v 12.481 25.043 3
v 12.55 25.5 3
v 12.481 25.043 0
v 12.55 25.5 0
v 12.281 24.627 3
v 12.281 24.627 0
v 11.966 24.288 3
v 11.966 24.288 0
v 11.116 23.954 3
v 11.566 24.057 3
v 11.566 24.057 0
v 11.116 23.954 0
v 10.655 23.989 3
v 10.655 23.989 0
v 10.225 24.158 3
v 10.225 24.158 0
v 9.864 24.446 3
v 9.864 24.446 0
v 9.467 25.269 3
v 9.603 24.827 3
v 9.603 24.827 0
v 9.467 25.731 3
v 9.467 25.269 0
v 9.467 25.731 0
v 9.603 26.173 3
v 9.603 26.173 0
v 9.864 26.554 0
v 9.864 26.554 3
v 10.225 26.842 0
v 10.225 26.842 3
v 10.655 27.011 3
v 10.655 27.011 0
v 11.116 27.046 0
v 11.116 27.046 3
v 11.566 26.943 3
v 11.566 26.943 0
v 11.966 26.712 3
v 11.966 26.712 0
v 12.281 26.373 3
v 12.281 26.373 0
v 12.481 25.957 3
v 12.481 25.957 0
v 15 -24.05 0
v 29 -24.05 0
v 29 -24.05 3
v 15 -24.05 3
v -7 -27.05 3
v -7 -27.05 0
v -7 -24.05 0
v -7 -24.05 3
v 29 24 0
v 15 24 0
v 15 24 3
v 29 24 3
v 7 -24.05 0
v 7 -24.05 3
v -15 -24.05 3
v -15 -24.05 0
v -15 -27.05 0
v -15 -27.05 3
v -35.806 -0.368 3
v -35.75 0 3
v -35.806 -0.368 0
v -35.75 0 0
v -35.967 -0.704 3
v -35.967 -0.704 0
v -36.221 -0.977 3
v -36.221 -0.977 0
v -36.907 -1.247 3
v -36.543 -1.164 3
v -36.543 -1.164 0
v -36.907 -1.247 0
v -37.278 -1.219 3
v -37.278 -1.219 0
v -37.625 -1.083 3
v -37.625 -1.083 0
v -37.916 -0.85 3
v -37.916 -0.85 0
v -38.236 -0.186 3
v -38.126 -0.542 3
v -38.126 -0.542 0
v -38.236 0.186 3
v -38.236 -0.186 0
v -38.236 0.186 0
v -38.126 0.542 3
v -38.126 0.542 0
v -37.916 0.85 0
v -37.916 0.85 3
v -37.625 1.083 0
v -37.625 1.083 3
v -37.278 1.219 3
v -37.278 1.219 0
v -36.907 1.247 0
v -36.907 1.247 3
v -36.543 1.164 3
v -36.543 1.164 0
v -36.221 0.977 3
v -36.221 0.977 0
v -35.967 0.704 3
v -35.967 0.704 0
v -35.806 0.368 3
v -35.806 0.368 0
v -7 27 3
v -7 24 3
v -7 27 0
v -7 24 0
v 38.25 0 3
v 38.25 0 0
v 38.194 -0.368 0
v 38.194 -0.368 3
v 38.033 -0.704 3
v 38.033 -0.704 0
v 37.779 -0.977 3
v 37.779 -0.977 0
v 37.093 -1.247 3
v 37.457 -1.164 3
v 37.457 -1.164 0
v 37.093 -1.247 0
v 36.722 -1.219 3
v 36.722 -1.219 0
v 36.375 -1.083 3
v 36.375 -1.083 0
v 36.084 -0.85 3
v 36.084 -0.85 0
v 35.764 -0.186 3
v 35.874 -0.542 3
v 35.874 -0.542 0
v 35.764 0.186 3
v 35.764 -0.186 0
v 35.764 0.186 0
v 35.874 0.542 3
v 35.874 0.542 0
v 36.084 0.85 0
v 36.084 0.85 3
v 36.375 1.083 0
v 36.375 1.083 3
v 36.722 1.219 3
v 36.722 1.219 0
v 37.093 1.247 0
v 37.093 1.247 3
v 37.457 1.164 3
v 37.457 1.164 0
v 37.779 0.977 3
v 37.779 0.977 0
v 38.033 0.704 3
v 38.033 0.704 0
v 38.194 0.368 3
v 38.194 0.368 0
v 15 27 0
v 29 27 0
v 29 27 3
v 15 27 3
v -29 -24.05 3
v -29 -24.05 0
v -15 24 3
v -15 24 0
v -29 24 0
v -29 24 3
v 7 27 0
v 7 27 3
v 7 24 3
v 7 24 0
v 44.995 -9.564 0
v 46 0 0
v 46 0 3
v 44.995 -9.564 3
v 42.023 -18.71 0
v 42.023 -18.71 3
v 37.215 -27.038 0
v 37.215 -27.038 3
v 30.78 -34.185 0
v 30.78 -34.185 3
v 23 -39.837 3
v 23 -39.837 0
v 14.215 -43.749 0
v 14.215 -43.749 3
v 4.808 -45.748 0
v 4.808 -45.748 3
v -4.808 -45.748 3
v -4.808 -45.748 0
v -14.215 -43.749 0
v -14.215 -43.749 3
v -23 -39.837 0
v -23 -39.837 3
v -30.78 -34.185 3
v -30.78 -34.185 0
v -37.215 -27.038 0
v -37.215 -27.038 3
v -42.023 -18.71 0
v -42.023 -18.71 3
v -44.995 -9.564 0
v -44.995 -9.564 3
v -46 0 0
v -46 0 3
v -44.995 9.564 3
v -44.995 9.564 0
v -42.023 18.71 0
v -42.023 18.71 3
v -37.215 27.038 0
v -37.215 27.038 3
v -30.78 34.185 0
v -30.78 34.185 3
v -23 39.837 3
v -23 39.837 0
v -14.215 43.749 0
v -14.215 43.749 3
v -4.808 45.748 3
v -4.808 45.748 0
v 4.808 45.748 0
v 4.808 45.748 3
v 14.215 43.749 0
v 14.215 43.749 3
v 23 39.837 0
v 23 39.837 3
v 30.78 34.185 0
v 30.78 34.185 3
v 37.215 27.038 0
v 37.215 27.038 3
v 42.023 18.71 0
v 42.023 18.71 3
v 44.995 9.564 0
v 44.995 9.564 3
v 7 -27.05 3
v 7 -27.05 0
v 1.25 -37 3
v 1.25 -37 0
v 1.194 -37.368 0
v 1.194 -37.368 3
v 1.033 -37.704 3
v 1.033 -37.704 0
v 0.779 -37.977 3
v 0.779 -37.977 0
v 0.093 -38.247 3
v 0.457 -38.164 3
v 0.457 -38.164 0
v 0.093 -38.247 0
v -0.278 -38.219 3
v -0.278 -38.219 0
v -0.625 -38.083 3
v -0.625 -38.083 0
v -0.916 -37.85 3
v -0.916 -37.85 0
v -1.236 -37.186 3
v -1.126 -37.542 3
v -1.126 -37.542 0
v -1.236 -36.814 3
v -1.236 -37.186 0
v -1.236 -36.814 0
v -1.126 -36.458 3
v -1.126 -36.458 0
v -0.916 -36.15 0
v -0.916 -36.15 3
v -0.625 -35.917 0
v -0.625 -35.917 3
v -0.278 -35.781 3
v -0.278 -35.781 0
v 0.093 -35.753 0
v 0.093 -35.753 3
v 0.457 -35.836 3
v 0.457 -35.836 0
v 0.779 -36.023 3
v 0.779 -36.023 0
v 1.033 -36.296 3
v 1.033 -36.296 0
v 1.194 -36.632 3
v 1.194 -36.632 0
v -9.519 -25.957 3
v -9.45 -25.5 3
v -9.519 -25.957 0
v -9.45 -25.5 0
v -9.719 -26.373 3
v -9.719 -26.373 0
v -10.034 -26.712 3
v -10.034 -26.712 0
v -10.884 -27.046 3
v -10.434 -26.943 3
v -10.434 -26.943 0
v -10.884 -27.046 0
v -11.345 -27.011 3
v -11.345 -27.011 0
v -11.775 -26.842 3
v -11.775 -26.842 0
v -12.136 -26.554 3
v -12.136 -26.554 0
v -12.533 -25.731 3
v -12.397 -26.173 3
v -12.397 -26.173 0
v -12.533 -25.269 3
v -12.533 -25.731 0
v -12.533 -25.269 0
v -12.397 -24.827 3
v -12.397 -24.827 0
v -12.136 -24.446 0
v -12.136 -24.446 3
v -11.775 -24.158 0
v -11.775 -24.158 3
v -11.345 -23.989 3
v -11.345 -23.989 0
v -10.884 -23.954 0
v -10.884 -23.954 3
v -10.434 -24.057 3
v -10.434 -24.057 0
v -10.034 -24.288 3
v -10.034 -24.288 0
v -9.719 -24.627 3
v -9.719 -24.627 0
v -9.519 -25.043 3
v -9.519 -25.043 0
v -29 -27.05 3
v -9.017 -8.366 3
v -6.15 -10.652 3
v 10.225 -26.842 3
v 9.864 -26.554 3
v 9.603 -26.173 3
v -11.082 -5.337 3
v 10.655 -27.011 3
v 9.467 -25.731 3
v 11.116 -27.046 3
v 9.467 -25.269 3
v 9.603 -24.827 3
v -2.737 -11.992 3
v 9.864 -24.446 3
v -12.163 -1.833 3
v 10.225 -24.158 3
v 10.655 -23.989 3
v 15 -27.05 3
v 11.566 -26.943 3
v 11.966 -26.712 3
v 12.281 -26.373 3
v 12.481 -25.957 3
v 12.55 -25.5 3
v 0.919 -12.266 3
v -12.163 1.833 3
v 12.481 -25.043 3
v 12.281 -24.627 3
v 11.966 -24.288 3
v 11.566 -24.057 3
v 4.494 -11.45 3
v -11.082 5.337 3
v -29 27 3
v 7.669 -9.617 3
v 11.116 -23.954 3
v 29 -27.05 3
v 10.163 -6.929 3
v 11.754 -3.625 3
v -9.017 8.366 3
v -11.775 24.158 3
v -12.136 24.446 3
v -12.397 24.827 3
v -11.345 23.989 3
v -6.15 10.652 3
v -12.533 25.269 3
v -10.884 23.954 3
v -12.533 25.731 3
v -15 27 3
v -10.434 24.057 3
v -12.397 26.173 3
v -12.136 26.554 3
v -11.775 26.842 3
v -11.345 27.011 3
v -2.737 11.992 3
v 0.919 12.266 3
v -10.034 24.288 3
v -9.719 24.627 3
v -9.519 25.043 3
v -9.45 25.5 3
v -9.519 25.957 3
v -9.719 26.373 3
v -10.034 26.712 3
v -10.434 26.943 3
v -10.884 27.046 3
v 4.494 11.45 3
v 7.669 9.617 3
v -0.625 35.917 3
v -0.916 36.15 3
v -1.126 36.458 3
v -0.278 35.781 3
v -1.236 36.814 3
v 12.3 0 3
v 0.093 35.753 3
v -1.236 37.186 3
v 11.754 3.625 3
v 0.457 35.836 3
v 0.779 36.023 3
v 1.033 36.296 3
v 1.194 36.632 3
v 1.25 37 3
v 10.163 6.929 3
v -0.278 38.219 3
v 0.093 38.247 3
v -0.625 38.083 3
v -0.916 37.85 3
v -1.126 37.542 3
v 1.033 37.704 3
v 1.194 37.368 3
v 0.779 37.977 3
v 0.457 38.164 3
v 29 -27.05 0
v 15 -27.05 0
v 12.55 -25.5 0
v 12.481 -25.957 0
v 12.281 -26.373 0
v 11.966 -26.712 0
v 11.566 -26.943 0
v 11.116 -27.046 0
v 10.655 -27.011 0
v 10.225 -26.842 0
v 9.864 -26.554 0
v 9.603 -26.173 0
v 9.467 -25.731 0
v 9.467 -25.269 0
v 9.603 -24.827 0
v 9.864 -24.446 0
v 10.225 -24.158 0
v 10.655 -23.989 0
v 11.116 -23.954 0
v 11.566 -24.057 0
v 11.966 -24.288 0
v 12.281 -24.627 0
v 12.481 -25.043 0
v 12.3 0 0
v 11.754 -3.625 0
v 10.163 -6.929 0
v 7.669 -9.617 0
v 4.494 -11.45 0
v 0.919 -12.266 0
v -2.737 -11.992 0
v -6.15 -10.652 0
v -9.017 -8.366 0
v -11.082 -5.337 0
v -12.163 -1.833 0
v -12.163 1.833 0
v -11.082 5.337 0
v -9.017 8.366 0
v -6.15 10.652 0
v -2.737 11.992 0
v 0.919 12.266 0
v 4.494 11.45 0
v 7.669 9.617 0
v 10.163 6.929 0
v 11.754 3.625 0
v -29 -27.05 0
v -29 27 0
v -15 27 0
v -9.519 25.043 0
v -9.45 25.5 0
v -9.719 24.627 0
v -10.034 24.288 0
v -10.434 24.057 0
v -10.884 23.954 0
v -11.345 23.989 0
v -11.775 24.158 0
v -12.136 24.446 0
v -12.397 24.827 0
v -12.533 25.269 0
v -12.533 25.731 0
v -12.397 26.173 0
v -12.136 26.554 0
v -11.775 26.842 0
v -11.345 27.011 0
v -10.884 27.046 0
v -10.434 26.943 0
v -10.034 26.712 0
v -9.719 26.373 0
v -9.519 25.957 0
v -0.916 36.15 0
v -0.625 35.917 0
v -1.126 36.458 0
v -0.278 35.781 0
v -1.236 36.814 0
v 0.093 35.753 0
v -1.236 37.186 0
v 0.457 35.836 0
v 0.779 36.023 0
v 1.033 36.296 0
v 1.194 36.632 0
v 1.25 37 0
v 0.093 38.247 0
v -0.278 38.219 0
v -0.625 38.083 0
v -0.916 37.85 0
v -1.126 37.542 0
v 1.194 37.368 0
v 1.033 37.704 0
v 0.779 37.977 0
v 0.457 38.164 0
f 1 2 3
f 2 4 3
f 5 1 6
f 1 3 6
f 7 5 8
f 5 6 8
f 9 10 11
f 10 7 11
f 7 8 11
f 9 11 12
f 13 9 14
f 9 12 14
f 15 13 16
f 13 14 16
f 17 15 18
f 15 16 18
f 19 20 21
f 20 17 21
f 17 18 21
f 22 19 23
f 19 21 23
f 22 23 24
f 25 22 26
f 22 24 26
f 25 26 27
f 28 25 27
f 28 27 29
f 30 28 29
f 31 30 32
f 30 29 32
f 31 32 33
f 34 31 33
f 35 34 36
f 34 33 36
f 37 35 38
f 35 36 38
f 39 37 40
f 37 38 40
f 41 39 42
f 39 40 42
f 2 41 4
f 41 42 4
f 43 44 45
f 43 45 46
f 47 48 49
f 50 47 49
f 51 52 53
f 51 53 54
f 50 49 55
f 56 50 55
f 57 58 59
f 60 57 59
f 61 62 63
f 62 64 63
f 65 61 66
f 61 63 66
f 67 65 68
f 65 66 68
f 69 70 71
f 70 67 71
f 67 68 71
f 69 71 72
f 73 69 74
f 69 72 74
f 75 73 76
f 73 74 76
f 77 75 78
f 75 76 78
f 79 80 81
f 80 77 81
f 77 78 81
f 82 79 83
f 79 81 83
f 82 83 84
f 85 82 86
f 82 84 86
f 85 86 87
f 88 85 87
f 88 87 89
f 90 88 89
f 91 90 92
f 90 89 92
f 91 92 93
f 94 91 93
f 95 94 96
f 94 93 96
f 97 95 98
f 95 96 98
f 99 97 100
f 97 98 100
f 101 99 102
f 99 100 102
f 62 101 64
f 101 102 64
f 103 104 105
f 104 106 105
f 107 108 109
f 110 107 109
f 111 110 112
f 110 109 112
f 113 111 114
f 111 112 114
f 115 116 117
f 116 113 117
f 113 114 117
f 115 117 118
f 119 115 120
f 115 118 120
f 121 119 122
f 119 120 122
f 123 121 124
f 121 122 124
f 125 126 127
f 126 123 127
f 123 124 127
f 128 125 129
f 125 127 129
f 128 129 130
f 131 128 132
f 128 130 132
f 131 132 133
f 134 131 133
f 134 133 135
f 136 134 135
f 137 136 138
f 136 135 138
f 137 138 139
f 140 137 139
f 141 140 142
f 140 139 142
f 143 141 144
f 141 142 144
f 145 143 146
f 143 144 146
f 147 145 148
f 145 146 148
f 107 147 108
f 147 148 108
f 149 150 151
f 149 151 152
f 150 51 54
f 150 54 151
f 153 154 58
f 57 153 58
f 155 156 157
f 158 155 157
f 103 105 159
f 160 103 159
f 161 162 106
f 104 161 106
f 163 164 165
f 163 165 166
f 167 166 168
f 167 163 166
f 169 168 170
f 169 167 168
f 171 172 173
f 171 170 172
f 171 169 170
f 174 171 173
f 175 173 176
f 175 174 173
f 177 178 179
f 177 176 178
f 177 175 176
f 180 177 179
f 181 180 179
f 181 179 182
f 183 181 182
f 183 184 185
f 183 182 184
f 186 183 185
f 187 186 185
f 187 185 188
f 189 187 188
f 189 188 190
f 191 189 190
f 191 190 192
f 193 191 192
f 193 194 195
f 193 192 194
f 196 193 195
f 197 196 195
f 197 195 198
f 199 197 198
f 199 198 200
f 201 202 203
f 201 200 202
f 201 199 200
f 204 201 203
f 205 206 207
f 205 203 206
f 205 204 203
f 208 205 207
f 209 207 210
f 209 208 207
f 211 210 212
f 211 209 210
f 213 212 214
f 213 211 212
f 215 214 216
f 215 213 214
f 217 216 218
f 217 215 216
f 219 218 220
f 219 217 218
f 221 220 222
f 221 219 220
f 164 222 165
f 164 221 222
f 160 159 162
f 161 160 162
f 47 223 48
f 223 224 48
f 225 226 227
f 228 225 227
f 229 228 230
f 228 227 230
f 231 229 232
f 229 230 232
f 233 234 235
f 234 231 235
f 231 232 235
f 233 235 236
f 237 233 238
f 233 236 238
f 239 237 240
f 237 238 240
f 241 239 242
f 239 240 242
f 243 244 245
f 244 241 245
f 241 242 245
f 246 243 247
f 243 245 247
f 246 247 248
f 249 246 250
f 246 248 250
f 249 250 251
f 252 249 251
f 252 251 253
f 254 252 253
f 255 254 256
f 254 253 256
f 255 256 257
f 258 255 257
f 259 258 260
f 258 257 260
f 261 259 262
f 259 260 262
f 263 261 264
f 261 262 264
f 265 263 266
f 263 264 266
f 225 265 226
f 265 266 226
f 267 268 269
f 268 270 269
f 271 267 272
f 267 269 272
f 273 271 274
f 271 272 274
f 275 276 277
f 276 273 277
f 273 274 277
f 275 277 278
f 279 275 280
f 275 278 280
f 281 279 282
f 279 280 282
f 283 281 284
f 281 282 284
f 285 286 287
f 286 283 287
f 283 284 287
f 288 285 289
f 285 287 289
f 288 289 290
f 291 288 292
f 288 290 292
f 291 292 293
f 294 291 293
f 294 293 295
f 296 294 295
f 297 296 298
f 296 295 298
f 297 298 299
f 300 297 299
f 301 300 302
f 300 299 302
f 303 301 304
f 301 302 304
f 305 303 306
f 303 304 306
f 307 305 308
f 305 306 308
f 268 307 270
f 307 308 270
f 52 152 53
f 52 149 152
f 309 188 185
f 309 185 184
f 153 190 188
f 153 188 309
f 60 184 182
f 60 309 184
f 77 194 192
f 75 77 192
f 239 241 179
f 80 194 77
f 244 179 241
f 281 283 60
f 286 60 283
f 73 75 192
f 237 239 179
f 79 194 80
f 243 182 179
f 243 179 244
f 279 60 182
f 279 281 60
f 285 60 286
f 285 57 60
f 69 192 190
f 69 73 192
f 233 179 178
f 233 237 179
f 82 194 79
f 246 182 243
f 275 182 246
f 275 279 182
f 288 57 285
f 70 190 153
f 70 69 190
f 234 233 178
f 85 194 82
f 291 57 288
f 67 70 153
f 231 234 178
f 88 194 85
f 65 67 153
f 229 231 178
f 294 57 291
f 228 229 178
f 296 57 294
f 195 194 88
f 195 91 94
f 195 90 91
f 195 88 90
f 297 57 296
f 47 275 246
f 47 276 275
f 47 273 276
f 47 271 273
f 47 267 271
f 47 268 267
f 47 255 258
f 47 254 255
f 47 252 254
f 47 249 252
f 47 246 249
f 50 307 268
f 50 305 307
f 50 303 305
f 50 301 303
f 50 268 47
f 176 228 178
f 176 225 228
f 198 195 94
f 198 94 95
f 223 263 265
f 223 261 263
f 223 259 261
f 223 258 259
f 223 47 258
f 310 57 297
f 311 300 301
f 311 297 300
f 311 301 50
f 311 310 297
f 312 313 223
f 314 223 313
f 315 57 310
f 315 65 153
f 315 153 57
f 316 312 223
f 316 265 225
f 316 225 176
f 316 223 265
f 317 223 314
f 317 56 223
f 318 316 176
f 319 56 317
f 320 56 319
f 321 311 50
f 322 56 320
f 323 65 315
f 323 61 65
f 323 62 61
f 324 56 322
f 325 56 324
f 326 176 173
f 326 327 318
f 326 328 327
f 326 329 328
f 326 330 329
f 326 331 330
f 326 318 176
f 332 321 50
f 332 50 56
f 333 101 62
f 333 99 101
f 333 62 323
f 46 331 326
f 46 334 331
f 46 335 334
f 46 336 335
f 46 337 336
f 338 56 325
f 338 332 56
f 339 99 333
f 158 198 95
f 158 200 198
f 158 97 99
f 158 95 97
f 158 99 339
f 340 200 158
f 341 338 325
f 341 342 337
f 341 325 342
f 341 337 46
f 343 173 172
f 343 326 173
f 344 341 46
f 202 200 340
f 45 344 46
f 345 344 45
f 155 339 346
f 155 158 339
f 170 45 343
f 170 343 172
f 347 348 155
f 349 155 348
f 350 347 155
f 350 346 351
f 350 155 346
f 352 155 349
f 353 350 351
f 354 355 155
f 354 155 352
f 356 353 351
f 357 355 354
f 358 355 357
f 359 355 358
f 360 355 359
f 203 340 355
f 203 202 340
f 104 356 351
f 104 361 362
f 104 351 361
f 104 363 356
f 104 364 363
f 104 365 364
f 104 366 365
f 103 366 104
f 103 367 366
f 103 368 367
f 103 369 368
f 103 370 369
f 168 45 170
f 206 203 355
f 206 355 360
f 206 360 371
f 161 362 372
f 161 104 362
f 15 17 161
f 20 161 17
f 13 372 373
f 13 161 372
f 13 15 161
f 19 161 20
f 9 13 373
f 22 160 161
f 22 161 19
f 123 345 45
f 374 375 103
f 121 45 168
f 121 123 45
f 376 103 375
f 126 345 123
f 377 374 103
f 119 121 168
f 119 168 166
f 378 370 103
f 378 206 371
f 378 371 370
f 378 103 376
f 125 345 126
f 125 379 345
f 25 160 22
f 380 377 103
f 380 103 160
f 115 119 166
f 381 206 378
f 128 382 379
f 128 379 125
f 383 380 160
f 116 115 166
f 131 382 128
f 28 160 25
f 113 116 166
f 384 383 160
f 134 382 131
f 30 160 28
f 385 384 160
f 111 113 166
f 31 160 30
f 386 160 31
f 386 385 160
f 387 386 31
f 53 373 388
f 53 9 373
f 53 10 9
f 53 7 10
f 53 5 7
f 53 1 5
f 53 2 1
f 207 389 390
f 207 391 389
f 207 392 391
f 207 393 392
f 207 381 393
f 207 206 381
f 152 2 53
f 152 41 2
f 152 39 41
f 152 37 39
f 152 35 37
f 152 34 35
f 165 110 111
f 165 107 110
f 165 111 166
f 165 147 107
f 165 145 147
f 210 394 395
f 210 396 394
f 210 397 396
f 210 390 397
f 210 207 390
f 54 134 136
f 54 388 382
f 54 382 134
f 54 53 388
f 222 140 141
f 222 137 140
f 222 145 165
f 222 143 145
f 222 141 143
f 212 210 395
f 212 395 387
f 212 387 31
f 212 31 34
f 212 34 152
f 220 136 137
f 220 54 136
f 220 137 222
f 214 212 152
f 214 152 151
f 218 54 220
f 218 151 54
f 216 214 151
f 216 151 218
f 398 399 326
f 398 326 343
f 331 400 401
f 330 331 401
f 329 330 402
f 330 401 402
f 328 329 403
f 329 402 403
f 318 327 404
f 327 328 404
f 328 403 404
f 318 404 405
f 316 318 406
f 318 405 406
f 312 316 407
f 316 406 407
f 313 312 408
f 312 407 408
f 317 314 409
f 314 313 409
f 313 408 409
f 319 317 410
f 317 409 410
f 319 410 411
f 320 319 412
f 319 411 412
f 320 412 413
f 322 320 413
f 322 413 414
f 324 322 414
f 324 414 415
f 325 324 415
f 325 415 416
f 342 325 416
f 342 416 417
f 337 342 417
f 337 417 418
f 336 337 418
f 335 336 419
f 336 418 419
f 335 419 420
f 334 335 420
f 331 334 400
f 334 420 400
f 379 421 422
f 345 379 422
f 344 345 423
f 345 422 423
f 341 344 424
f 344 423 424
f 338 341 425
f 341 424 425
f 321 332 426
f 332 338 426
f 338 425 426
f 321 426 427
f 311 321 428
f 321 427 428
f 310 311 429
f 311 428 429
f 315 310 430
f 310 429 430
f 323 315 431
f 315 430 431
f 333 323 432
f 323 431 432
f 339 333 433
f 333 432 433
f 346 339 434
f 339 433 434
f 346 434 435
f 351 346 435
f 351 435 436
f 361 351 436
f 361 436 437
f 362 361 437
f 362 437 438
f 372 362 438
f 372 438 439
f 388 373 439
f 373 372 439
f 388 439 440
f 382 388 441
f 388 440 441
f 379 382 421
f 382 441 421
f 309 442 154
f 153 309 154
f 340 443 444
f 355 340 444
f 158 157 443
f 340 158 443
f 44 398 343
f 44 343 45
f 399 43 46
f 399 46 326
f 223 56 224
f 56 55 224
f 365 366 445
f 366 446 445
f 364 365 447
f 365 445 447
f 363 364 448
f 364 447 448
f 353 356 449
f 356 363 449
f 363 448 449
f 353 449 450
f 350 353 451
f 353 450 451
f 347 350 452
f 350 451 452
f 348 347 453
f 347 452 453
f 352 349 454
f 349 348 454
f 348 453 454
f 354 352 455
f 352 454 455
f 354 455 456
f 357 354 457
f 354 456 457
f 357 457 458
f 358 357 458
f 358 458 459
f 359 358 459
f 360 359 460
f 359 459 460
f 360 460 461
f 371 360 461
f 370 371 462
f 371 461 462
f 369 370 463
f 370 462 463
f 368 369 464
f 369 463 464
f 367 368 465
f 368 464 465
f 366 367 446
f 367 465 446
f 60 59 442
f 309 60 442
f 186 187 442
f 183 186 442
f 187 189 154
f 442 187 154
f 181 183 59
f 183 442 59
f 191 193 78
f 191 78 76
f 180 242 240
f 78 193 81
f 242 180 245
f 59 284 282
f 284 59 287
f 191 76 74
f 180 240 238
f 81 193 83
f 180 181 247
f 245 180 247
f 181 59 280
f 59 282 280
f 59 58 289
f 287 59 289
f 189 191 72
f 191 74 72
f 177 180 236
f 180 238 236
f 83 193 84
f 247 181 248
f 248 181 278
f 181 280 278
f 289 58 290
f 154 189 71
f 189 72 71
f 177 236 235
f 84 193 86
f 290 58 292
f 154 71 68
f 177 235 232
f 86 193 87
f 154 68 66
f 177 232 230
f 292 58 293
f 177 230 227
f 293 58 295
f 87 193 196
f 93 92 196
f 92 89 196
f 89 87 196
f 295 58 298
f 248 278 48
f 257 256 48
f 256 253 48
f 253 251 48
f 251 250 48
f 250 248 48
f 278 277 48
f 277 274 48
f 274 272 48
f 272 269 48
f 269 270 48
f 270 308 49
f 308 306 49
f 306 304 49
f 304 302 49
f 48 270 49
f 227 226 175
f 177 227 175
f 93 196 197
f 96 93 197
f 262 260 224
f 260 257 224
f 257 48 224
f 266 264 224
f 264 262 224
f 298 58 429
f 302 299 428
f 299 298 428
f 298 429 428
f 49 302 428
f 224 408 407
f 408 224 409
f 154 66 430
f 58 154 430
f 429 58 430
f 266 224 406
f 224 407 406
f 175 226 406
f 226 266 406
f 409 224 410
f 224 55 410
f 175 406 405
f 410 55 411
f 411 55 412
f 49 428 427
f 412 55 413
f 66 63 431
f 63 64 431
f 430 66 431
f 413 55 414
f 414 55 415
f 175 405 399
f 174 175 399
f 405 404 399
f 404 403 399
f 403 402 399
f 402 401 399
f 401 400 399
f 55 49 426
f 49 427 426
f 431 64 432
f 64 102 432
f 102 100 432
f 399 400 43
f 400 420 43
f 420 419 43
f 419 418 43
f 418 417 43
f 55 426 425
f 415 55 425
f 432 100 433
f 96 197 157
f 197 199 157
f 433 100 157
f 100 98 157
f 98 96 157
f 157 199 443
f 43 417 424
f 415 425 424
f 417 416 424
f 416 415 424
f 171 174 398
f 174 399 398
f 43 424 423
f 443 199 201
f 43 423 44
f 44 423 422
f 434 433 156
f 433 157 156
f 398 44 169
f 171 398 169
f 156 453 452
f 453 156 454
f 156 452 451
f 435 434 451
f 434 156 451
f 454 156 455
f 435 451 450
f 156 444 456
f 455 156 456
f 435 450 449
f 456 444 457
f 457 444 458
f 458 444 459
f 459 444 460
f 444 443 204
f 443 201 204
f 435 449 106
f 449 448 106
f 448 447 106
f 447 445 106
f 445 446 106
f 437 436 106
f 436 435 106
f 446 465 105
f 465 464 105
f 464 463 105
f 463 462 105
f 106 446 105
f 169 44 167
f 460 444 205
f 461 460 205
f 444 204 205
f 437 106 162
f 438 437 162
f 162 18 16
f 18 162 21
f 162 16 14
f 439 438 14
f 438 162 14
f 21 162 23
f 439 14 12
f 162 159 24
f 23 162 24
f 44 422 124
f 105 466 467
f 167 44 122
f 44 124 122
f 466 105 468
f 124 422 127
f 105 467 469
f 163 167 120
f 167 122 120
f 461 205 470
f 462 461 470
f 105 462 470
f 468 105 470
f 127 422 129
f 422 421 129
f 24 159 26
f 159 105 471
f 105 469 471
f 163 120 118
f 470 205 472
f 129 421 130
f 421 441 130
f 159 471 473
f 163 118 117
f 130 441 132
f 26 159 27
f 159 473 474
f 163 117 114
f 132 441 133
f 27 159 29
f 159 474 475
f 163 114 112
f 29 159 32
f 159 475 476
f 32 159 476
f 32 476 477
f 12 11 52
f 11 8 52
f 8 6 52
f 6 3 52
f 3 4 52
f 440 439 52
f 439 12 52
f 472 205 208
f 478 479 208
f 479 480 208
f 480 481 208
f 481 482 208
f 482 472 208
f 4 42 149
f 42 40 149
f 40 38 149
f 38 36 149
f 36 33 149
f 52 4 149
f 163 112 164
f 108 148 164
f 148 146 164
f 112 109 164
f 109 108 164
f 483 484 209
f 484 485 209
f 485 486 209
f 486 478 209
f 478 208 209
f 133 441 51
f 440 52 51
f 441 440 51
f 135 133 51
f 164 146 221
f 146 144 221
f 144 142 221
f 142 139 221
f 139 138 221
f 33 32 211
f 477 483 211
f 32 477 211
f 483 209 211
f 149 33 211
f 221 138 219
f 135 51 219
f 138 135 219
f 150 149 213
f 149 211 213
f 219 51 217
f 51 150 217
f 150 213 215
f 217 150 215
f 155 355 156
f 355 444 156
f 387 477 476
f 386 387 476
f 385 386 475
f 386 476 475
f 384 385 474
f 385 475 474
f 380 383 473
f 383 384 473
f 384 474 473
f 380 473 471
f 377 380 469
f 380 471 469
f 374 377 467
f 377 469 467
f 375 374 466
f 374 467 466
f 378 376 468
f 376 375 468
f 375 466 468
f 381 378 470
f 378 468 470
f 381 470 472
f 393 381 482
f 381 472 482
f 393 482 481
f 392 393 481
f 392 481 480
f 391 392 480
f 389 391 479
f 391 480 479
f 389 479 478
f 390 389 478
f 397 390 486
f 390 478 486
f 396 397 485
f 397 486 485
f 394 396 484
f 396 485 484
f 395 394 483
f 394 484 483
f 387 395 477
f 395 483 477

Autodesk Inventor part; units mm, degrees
ref_plane "YZ Plane" through (0, 0, 0) normal (1, 0, 0) x (0, 1, 0)
ref_plane "XZ Plane" through (0, 0, 0) normal (0, 1, 0) x (-1, 0, 0)
ref_plane "XY Plane" through (0, 0, 0) normal (0, 0, 1) x (1, 0, 0)
sketch "Sketch3" plane through (0, 0, 0) normal (0, 0, 1) x (1, 0, 0)
  circle A0 centre (0, 0) radius 46
  circle A1 centre (0, 0) radius 12.3
  circle A2 centre (0, 0) radius 37 construction
  circle A3 centre (0, 37) radius 1.25
  circle A4 centre (37, 0) radius 1.25
  circle A5 centre (0, -37) radius 1.25
  circle A6 centre (-37, 0) radius 1.25
  line L0 (-11, 25.5) -> (-11, -25.5) construction
  circle A7 centre (-11, 25.5) radius 1.55
  circle A8 centre (-11, -25.5) radius 1.55
  circle A9 centre (11, -25.5) radius 1.55
  line L1 (7, -27.05) -> (-7, -27.05)
  line L2 (-7, -27.05) -> (-7, -24.05)
  line L3 (-7, -24.05) -> (7, -24.05)
  line L4 (7, -24.05) -> (7, -27.05)
  line L5 (-15, -27.05) -> (-29, -27.05)
  line L6 (-29, -27.05) -> (-29, -24.05)
  line L7 (-29, -24.05) -> (-15, -24.05)
  line L8 (-15, -24.05) -> (-15, -27.05)
  line L9 (15, -27.05) -> (29, -27.05)
  line L10 (29, -27.05) -> (29, -24.05)
  line L11 (29, -24.05) -> (15, -24.05)
  line L12 (15, -24.05) -> (15, -27.05)
  line L13 (18.1239, 27.05) -> (15, 27.05)
  line L14 (7, 24) -> (-7, 24)
  line L15 (-7, 24) -> (-7, 27)
  line L16 (-7, 27) -> (7, 27)
  line L17 (7, 27) -> (7, 24)
  line L18 (-15, 24) -> (-29, 24)
  line L19 (-29, 24) -> (-29, 27)
  line L20 (-29, 27) -> (-15, 27)
  line L21 (-15, 27) -> (-15, 24)
  line L22 (15, 24) -> (29, 24)
  line L23 (29, 24) -> (29, 27)
  line L24 (29, 27) -> (15, 27)
  line L25 (15, 27) -> (15, 24)
  circle A10 centre (11, 25.5) radius 1.55
  line L26 (-46, -25.55) -> (46, -25.55) construction
  point P0 (46, 0)
  dimension "d74" = 92
  dimension "d32" = 2.5
  dimension "d33" = 2.5
  dimension "d34" = 2.5
  dimension "d35" = 2.5
  dimension "d45" = 3.1
  dimension "d46" = 3.1
  dimension "d47" = 3.1
  dimension "d50" = 14
  dimension "d51" = 4
  dimension "d53" = 14
  dimension "d54" = 4
  dimension "d57" = 14
  dimension "d58" = 14
  dimension "d59" = 14
  dimension "d60" = 3
  dimension "d61" = 14
  dimension "d64" = 3
  dimension "d65" = 3
  dimension "d71" = 1.5
  dimension "d72" = 1.5
  dimension "d75" = 74
  dimension "d78" = 24.6
  dimension "d80" = 3.1
  dimension "d81" = 25.5
  dimension "d82" = 25.5
  dimension "d83" = 22
  dimension "d84" = 11
  dimension "d87" = 4
  dimension "d91" = 22
  dimension "d92" = 1.5
  dimension "d93" = 1.5
  dimension "d94" = 1.5
  dimension "d95" = 1.5
  dimension "d96" = 1.5
  dimension "d97" = 1.5
  dimension "d98" = 4
extrude "Extrusion2" add sketch "Sketch3" along normal blind 3
properties part number "Base4"
